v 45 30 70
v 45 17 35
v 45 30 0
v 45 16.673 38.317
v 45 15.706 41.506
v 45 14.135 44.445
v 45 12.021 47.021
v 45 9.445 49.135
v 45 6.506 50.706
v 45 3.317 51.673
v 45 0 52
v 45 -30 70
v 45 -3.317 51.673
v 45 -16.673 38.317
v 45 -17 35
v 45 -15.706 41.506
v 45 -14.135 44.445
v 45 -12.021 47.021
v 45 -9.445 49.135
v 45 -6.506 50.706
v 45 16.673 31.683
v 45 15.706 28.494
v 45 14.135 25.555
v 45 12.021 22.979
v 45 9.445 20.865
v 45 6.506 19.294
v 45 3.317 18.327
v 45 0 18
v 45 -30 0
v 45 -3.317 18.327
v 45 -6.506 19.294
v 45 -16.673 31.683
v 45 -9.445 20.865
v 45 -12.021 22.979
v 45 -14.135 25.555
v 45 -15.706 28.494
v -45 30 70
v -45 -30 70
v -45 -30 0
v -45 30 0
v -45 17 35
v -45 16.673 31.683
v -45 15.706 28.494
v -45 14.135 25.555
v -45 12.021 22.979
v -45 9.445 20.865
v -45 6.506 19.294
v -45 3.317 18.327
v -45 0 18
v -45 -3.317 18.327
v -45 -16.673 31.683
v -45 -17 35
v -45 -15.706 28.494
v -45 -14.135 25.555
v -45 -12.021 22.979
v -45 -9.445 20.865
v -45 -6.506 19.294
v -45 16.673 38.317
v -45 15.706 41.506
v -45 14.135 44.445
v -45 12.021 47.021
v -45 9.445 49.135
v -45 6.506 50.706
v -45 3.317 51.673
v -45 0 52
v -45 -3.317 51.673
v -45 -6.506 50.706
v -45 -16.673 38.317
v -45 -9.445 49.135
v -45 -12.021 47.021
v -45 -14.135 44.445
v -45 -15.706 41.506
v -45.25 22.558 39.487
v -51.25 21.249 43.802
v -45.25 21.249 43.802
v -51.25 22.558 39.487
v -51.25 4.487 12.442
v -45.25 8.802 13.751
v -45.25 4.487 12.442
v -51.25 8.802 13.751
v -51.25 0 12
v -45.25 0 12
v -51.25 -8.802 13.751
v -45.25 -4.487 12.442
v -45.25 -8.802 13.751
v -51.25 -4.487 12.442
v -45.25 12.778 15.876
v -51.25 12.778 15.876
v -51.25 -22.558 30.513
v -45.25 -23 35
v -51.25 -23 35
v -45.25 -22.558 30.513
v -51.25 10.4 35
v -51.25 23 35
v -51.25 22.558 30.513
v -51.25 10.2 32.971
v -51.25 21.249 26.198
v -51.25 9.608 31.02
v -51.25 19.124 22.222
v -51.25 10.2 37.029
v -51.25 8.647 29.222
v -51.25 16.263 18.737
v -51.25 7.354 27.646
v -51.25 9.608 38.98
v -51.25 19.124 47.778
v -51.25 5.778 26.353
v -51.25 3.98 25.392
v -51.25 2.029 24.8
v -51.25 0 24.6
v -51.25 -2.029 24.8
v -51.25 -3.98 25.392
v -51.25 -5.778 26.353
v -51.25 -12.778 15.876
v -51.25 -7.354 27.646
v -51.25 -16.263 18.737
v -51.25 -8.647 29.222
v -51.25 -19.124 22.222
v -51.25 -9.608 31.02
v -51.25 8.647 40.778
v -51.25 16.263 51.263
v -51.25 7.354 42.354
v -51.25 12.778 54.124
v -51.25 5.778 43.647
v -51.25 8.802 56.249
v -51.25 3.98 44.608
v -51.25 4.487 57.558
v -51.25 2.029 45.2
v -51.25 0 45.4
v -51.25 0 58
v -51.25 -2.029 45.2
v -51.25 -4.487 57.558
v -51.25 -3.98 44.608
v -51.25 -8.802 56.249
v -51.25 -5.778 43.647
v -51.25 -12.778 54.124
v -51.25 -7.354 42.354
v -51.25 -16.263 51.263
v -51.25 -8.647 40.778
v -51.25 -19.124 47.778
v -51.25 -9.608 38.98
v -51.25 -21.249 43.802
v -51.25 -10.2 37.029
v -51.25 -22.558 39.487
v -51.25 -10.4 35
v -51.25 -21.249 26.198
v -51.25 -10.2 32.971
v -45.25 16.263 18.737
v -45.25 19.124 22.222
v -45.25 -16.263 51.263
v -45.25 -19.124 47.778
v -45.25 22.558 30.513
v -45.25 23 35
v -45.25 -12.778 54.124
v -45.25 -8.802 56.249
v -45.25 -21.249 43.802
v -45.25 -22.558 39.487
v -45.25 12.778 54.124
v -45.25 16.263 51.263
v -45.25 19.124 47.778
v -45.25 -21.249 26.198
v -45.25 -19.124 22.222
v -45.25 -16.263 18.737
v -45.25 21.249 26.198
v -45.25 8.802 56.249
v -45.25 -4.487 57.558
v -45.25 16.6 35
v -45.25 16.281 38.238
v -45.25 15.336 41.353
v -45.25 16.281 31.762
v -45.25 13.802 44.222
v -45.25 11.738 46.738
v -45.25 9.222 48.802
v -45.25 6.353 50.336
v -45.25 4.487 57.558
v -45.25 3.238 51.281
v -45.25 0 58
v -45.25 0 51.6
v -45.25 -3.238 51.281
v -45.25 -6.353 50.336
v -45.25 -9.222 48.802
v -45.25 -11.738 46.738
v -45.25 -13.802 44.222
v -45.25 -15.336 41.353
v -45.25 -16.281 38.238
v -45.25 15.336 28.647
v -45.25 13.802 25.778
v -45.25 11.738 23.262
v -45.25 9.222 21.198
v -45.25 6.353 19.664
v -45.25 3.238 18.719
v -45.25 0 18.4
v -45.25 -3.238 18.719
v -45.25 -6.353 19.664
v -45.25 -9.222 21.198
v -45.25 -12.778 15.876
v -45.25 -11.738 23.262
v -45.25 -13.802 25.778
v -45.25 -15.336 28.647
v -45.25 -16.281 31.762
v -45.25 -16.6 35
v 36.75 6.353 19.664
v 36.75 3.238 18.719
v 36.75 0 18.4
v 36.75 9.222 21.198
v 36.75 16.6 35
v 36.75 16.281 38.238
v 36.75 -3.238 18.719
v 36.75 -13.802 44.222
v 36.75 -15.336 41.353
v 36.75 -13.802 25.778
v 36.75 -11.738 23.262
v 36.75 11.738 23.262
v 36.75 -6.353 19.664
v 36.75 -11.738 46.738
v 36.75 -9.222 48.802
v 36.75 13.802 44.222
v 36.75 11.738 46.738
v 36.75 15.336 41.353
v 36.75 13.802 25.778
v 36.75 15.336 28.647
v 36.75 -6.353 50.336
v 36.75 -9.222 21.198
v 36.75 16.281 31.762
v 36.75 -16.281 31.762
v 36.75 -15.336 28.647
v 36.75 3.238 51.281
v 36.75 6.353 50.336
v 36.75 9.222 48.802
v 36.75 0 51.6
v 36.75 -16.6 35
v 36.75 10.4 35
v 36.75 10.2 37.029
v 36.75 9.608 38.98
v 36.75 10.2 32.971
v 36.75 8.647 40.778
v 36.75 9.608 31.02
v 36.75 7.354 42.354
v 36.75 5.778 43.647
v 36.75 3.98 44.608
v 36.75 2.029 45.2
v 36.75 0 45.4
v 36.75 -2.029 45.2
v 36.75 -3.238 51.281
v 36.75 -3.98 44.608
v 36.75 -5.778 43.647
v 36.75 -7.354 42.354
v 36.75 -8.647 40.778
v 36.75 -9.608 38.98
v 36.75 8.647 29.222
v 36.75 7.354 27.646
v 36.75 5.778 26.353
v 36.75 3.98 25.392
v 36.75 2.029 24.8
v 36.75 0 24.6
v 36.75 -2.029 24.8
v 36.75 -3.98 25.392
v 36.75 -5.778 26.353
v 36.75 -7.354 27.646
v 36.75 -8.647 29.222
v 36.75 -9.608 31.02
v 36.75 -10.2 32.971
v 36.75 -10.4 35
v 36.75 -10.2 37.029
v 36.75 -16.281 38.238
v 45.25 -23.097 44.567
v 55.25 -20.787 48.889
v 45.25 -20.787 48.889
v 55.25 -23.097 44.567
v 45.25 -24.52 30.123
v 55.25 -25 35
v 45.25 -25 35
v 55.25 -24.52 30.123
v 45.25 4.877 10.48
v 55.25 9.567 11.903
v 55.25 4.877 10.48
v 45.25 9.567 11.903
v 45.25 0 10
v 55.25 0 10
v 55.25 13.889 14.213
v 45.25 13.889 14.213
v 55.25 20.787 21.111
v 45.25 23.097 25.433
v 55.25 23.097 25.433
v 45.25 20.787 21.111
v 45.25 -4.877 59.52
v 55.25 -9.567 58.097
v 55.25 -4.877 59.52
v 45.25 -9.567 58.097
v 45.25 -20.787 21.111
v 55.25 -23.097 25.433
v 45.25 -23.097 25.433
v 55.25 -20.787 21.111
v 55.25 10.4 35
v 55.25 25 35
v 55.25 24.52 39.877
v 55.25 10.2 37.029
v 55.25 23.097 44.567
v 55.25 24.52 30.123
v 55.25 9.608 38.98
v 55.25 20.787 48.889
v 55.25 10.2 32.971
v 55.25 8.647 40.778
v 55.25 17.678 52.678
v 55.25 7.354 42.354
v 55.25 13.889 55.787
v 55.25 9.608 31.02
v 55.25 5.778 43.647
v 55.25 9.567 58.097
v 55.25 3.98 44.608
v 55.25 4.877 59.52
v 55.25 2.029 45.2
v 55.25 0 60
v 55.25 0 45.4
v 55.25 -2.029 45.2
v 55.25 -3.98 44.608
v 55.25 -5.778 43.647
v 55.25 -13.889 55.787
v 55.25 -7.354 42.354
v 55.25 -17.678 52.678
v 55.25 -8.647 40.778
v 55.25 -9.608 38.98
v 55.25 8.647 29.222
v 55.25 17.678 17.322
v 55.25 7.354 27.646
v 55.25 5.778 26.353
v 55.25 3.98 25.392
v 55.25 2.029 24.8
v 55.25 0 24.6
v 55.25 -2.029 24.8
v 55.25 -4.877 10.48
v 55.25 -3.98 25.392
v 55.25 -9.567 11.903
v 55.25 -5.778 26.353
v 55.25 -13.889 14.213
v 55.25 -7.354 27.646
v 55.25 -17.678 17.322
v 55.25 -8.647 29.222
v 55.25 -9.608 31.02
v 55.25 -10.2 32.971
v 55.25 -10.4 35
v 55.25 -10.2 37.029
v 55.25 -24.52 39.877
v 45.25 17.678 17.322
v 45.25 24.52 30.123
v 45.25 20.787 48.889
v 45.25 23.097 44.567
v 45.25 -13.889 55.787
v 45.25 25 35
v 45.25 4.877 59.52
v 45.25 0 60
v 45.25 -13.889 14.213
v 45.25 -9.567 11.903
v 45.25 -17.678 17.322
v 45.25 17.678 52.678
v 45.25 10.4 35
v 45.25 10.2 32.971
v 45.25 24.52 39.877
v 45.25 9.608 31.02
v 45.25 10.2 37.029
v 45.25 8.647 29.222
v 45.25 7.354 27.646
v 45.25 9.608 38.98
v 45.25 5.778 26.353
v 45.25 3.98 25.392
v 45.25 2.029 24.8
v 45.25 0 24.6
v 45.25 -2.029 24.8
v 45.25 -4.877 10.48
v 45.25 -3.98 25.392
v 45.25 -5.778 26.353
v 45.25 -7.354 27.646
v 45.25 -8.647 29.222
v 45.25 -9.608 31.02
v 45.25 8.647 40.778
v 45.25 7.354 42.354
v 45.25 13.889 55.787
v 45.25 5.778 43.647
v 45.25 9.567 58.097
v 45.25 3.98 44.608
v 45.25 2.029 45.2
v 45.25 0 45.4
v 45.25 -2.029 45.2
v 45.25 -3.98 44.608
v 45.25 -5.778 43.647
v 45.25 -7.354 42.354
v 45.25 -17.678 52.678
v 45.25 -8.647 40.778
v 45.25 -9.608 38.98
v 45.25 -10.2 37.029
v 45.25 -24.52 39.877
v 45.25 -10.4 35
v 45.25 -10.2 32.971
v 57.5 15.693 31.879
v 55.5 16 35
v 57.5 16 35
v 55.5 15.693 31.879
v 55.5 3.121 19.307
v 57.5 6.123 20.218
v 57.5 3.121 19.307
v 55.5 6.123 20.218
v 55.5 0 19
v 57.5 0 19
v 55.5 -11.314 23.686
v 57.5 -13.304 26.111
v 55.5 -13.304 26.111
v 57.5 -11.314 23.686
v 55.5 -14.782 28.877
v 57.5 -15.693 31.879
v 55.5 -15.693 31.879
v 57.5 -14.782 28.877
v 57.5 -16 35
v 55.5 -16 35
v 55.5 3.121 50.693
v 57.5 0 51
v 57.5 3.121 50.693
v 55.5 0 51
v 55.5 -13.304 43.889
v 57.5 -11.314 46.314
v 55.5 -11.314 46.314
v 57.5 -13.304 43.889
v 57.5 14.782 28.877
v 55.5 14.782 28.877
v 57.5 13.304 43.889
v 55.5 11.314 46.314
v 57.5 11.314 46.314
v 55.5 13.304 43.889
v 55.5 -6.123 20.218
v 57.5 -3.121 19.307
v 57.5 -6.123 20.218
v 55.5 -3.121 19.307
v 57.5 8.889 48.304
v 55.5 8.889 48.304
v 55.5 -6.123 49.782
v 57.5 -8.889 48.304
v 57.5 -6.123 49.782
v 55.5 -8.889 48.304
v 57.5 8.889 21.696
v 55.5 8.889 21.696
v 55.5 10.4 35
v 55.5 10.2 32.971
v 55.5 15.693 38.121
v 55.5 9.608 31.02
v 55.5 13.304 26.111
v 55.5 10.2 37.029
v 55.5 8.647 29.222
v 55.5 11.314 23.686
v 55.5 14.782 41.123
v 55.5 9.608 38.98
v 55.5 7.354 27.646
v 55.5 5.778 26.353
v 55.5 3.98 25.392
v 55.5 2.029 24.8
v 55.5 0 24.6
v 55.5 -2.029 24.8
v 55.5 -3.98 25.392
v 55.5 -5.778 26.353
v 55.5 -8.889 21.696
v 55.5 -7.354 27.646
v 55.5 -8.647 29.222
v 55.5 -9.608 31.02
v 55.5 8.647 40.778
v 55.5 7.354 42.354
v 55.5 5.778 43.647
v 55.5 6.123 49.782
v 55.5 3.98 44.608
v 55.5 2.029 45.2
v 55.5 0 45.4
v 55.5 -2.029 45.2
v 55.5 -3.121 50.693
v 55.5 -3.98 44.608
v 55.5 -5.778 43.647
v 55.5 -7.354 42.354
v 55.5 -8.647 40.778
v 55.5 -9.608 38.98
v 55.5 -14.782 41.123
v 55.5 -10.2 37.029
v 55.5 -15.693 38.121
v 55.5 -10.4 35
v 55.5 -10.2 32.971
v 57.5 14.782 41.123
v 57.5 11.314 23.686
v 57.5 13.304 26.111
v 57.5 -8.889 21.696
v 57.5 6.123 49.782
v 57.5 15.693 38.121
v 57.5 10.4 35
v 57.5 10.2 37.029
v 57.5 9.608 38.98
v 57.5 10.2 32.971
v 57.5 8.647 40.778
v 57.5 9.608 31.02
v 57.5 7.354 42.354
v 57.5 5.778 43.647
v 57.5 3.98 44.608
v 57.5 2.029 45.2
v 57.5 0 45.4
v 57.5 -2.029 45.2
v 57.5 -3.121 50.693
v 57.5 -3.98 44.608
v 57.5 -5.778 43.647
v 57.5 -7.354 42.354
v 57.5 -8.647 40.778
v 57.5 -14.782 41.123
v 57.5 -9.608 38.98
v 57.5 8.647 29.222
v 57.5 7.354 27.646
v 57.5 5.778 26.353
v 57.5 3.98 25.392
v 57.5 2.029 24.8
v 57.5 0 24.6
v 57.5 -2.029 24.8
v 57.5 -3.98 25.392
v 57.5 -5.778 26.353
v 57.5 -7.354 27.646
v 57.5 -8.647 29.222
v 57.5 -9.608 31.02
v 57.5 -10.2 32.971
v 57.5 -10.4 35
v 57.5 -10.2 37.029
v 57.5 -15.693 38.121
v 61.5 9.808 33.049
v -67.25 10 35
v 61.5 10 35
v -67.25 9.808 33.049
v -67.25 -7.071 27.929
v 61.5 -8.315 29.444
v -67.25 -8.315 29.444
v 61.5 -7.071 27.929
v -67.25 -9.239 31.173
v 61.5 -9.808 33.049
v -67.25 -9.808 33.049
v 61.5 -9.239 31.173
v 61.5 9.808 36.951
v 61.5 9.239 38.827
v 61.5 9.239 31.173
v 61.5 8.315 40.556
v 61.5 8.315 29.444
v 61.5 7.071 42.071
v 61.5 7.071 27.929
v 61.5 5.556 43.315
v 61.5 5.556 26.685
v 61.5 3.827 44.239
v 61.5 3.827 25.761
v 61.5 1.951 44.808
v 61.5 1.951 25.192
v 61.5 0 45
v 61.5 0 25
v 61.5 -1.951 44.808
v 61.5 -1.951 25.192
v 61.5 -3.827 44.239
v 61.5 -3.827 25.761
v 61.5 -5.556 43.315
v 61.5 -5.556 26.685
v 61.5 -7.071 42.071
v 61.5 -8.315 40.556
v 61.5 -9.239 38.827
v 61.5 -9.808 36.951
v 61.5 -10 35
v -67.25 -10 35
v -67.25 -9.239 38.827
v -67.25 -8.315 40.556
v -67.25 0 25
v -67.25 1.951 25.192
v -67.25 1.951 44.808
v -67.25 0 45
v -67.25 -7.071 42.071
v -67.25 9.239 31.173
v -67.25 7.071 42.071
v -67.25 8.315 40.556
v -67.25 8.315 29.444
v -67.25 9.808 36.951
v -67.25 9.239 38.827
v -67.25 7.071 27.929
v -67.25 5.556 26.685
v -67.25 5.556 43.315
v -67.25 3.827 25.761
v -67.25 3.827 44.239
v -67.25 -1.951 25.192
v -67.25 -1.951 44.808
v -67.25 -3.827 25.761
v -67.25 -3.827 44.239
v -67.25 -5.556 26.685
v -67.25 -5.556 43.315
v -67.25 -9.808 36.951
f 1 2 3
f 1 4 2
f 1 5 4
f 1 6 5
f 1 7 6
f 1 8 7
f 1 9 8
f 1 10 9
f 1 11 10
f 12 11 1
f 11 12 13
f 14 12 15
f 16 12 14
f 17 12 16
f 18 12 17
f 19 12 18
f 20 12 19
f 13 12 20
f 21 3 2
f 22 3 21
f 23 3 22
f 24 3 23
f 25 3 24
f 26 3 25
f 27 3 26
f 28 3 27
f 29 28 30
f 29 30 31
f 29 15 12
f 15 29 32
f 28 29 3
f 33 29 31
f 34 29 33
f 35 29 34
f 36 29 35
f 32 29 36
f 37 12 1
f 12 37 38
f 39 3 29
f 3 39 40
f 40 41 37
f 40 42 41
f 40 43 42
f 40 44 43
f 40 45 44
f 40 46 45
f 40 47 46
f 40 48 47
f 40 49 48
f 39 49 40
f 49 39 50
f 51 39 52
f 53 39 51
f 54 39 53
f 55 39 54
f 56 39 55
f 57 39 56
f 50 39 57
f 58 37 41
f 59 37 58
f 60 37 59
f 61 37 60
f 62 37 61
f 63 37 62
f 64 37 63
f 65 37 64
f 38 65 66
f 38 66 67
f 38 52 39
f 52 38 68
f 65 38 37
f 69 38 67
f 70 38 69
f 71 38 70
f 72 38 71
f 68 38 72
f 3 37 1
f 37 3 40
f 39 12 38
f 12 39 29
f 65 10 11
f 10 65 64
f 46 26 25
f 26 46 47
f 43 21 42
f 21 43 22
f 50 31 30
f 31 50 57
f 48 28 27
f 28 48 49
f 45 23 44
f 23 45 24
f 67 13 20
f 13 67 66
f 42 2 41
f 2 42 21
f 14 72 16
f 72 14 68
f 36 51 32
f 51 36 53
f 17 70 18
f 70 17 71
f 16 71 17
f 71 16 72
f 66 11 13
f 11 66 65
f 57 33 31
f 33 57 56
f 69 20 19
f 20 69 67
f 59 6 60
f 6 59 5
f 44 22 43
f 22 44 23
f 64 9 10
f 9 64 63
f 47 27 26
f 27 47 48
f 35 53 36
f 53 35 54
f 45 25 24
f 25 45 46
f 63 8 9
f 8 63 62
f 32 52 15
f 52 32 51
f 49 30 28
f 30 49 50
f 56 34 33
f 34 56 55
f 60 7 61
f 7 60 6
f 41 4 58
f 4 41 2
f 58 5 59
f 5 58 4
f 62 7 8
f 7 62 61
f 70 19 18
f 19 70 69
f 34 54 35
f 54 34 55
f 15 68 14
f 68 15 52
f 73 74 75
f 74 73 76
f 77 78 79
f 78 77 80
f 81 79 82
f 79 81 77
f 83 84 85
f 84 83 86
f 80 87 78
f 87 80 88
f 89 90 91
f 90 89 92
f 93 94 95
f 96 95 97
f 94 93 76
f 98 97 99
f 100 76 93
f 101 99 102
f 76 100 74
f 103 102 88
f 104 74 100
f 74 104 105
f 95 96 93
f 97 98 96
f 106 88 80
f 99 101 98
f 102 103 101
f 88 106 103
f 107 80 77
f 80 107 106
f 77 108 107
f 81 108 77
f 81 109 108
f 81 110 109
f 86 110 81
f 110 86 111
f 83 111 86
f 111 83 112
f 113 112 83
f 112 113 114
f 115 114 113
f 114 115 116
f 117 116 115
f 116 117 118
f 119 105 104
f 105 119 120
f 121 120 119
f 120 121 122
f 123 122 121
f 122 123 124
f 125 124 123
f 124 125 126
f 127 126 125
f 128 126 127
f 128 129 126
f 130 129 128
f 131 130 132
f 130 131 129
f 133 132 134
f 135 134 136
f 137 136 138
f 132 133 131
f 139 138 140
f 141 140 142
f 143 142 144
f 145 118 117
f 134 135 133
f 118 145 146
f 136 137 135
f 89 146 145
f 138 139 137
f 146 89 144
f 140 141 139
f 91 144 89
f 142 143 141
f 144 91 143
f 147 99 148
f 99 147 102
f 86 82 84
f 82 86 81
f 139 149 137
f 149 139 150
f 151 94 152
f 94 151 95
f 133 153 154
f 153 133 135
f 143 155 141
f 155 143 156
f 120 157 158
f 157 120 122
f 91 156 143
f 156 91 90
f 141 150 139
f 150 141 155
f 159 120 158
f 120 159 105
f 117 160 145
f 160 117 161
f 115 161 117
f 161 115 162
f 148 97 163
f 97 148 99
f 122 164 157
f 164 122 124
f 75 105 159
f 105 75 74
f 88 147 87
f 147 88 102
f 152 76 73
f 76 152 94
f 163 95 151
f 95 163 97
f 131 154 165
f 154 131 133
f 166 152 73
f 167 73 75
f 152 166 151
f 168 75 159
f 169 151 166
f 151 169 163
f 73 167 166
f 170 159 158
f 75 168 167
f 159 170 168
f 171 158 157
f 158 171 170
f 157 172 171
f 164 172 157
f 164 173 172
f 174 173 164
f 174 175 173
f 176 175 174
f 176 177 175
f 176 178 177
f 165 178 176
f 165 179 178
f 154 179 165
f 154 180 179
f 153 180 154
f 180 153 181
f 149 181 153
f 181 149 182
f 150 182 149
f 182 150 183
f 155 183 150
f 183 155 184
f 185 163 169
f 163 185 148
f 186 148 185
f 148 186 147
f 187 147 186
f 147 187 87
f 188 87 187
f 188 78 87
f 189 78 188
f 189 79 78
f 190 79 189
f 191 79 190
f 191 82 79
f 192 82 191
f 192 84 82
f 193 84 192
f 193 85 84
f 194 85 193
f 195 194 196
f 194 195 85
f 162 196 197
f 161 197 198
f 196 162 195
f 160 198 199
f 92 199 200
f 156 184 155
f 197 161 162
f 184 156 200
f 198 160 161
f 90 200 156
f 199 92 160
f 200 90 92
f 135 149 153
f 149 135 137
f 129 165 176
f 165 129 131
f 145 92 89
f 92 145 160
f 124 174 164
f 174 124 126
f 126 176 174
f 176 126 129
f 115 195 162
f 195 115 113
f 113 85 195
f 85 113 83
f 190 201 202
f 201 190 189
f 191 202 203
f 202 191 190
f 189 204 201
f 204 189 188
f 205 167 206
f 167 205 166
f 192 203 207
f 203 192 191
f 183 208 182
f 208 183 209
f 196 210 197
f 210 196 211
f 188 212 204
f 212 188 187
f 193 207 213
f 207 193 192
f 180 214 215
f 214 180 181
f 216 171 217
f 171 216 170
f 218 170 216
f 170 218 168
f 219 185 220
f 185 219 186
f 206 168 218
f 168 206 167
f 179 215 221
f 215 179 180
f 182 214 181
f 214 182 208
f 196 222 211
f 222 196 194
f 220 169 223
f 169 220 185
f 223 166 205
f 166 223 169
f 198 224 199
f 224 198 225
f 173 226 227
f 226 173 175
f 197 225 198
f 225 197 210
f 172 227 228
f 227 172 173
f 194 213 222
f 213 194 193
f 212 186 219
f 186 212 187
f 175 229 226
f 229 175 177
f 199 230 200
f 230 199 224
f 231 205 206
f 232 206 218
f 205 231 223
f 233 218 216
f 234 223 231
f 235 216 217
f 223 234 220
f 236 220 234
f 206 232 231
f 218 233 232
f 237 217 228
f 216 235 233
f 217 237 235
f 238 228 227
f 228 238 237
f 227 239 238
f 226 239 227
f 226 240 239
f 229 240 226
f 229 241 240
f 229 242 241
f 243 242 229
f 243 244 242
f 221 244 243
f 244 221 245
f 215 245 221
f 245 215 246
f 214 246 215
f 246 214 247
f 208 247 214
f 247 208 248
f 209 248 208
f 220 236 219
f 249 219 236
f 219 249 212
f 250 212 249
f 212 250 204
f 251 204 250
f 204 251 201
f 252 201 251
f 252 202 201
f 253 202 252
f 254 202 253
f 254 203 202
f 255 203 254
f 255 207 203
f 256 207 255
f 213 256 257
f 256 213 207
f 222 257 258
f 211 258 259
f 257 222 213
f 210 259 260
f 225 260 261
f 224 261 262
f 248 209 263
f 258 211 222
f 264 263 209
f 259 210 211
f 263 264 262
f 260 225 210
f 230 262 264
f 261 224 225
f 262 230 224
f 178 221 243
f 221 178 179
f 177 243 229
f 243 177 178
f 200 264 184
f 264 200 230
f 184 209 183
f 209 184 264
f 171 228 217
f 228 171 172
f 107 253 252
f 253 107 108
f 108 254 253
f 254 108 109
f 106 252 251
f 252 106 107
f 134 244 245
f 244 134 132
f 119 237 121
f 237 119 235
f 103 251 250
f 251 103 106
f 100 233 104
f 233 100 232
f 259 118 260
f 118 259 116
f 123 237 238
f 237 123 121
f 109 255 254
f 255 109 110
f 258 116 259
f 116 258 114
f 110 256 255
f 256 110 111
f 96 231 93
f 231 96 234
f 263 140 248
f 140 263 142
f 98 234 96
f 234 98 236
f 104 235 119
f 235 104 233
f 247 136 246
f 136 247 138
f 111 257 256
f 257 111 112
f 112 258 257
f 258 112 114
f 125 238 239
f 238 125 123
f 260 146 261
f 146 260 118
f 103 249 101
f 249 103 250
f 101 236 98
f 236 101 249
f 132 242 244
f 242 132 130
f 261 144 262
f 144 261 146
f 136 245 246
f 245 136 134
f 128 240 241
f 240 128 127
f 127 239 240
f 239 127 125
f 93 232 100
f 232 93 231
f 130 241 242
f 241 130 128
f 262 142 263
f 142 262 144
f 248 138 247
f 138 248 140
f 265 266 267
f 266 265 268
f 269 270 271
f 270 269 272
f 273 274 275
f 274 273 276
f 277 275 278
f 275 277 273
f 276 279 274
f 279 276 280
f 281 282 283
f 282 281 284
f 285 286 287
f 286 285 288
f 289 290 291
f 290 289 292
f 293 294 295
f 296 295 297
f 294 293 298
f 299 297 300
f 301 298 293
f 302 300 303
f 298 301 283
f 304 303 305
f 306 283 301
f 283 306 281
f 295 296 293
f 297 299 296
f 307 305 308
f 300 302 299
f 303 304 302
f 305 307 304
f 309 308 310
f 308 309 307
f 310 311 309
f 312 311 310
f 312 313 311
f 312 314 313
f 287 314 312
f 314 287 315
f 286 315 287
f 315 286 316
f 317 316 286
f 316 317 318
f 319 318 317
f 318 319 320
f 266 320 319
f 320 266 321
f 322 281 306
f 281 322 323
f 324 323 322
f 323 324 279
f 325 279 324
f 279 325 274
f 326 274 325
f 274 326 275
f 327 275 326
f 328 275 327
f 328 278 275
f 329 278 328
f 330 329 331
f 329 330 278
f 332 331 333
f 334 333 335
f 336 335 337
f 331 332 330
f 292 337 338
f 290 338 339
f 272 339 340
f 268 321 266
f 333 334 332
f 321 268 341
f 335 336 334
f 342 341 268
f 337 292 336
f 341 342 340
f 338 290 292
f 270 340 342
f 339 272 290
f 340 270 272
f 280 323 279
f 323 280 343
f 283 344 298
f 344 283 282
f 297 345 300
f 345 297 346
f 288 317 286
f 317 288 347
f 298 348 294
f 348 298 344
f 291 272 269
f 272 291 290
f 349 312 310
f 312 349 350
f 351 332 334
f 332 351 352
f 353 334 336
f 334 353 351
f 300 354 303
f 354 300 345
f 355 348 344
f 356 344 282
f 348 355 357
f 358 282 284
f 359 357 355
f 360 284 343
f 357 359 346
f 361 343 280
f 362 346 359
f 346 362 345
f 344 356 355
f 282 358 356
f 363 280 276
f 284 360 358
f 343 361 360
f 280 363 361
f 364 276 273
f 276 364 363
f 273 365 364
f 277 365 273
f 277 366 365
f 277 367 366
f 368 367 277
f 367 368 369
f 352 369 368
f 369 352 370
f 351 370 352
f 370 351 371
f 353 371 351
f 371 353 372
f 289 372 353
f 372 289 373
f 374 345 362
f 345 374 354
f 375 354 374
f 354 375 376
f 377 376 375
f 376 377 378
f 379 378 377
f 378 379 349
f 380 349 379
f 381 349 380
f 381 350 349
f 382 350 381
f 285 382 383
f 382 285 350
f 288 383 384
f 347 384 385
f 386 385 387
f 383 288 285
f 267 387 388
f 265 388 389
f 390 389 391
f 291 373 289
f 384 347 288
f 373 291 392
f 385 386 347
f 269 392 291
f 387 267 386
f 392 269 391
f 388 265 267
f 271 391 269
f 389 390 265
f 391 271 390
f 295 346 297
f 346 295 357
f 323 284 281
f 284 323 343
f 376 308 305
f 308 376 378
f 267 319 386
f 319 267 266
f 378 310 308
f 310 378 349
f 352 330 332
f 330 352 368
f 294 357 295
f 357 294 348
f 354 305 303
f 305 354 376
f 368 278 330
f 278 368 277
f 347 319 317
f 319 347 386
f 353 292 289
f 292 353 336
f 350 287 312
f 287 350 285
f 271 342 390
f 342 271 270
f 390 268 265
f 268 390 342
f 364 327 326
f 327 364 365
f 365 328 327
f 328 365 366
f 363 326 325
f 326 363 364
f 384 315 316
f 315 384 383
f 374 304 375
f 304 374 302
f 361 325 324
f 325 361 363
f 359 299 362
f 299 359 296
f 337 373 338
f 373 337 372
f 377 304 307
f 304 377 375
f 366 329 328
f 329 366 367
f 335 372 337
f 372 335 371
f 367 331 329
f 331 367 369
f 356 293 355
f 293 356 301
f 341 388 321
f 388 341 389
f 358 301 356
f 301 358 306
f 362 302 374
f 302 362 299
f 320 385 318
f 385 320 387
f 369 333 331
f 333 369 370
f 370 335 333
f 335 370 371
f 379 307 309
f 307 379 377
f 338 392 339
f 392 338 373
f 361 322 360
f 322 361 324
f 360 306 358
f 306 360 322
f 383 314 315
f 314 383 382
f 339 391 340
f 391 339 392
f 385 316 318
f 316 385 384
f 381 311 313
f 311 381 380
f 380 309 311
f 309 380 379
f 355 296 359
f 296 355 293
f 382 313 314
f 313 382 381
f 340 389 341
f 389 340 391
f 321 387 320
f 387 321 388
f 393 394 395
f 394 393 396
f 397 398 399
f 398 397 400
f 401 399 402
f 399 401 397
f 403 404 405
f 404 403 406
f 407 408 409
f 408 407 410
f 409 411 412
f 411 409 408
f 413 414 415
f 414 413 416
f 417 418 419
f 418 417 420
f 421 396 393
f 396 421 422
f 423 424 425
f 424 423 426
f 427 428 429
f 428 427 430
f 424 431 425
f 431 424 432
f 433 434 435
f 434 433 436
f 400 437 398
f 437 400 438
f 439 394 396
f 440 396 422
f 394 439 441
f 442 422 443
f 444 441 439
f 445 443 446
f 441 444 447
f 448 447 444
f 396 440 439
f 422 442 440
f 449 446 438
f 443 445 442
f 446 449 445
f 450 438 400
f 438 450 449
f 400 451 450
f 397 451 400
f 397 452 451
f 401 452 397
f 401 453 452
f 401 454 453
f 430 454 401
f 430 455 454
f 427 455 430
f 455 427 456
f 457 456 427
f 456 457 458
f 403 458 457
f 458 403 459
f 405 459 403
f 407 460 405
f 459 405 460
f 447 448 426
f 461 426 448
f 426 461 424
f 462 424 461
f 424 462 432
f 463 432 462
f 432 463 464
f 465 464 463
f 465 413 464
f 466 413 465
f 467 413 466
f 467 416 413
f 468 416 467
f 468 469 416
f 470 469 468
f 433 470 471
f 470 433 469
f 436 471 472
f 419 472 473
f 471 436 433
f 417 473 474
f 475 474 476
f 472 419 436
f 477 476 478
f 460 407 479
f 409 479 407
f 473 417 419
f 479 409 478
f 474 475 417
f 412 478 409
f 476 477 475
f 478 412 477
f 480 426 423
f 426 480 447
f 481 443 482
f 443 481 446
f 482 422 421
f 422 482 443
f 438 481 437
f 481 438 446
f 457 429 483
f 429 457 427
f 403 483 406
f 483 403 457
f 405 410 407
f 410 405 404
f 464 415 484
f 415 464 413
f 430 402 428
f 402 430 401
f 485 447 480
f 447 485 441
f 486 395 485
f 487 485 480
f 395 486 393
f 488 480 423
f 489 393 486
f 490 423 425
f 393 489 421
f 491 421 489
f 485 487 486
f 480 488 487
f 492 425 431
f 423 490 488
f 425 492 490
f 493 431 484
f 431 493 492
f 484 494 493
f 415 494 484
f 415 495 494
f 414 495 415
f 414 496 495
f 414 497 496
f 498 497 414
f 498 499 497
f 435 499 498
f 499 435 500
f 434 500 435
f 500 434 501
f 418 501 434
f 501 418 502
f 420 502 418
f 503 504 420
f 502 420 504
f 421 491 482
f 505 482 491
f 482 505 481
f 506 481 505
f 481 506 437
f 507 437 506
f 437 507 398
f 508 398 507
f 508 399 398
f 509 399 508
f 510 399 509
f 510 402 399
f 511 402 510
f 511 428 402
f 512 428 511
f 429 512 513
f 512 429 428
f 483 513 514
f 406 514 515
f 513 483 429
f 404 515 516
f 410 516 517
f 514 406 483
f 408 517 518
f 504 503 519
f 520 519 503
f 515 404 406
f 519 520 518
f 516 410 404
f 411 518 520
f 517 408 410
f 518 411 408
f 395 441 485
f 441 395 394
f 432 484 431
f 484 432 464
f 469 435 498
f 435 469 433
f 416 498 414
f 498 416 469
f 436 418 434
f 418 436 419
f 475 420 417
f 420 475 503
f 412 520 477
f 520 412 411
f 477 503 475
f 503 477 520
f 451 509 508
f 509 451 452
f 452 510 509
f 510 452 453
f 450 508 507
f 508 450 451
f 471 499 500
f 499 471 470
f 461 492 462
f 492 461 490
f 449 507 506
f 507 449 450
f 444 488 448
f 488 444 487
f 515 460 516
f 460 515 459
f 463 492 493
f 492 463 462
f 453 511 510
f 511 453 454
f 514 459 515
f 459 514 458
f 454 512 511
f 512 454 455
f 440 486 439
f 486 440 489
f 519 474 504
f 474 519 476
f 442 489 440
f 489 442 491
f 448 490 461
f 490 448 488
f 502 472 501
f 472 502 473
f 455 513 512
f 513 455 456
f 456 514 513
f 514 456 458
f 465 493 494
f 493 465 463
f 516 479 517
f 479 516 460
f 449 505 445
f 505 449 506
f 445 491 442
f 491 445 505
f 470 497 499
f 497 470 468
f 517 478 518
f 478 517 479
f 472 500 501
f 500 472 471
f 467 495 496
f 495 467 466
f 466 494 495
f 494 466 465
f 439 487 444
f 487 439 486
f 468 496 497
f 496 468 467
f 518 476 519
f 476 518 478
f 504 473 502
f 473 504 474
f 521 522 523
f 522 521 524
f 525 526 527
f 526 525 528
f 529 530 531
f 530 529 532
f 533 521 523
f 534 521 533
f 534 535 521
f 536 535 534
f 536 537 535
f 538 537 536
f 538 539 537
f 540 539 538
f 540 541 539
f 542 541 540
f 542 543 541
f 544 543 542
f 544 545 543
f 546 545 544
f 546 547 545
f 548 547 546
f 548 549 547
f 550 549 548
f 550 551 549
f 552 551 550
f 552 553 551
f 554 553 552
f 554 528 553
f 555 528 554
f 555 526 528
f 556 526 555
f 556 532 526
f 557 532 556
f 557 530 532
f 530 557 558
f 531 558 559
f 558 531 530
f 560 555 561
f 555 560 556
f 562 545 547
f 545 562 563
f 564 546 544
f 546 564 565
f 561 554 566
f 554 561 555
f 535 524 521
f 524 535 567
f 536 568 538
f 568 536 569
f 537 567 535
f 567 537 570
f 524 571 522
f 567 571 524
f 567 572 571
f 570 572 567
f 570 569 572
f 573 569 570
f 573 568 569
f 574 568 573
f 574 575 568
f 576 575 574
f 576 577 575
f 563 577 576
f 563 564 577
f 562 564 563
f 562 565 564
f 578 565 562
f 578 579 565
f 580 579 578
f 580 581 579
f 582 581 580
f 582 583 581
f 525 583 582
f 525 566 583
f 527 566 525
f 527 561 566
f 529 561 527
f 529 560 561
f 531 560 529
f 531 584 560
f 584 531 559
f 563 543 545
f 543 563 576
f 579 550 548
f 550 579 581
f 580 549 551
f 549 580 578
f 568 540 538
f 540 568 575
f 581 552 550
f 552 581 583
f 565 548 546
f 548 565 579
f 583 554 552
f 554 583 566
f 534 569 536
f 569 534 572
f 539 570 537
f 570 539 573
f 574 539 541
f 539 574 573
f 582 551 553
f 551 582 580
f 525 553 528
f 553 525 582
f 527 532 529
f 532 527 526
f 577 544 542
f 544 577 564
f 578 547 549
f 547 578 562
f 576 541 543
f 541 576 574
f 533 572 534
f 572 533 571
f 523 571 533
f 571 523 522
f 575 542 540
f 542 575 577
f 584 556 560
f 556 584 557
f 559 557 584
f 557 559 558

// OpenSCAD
$fn = 32;

// ------------------------------------------------------------------------
// Bushed housing: 90 x 60 x 70 mm housing, bushing d33.2
// Every part is its own module, assembly() places them once.
// ------------------------------------------------------------------------

// --- part 1 ---
module housing() {
  difference() {
    translate([-45, -30, 0]) cube([90, 60, 70]);
    translate([0, 0, 35]) rotate([0, 90, 0]) cylinder(h = 92, d = 34, center = true);
  }
}

// --- part 2 ---
module bushing() {
  difference() {
    union() {
      cylinder(h = 6, d = 46);
      translate([0, 0, 6]) cylinder(h = 82, d = 33.2);
    }
    translate([0, 0, -1]) cylinder(h = 90, d = 20.8);
  }
}

// --- part 3 ---
module shaft() {
  translate([0, 0, -64.375]) cylinder(h = 128.75, d = 20);
}

// --- part 4 ---
module cover() {
  difference() {
    cylinder(h = 10, d = 50);
    translate([0, 0, -1]) cylinder(h = 12, d = 20.8);
  }
}

// --- part 5 ---
module washer() {
  difference() {
      translate([0, 0, 0]) cylinder(h = 2, d = 32);
      translate([0, 0, -1]) cylinder(h = 4, d = 20.8);
    }
}

// --- assembly ---
module assembly() {
  translate([0, 0, 0]) rotate([0, 0, 0]) housing();
  translate([-51.25, 0, 35]) rotate([0, 90, 0]) bushing();
  translate([-2.875, 0, 35]) rotate([0, 90, 0]) shaft();
  translate([45.25, 0, 35]) rotate([0, 90, 0]) cover();
  translate([55.5, 0, 35]) rotate([0, 90, 0]) washer();
}

assembly();
